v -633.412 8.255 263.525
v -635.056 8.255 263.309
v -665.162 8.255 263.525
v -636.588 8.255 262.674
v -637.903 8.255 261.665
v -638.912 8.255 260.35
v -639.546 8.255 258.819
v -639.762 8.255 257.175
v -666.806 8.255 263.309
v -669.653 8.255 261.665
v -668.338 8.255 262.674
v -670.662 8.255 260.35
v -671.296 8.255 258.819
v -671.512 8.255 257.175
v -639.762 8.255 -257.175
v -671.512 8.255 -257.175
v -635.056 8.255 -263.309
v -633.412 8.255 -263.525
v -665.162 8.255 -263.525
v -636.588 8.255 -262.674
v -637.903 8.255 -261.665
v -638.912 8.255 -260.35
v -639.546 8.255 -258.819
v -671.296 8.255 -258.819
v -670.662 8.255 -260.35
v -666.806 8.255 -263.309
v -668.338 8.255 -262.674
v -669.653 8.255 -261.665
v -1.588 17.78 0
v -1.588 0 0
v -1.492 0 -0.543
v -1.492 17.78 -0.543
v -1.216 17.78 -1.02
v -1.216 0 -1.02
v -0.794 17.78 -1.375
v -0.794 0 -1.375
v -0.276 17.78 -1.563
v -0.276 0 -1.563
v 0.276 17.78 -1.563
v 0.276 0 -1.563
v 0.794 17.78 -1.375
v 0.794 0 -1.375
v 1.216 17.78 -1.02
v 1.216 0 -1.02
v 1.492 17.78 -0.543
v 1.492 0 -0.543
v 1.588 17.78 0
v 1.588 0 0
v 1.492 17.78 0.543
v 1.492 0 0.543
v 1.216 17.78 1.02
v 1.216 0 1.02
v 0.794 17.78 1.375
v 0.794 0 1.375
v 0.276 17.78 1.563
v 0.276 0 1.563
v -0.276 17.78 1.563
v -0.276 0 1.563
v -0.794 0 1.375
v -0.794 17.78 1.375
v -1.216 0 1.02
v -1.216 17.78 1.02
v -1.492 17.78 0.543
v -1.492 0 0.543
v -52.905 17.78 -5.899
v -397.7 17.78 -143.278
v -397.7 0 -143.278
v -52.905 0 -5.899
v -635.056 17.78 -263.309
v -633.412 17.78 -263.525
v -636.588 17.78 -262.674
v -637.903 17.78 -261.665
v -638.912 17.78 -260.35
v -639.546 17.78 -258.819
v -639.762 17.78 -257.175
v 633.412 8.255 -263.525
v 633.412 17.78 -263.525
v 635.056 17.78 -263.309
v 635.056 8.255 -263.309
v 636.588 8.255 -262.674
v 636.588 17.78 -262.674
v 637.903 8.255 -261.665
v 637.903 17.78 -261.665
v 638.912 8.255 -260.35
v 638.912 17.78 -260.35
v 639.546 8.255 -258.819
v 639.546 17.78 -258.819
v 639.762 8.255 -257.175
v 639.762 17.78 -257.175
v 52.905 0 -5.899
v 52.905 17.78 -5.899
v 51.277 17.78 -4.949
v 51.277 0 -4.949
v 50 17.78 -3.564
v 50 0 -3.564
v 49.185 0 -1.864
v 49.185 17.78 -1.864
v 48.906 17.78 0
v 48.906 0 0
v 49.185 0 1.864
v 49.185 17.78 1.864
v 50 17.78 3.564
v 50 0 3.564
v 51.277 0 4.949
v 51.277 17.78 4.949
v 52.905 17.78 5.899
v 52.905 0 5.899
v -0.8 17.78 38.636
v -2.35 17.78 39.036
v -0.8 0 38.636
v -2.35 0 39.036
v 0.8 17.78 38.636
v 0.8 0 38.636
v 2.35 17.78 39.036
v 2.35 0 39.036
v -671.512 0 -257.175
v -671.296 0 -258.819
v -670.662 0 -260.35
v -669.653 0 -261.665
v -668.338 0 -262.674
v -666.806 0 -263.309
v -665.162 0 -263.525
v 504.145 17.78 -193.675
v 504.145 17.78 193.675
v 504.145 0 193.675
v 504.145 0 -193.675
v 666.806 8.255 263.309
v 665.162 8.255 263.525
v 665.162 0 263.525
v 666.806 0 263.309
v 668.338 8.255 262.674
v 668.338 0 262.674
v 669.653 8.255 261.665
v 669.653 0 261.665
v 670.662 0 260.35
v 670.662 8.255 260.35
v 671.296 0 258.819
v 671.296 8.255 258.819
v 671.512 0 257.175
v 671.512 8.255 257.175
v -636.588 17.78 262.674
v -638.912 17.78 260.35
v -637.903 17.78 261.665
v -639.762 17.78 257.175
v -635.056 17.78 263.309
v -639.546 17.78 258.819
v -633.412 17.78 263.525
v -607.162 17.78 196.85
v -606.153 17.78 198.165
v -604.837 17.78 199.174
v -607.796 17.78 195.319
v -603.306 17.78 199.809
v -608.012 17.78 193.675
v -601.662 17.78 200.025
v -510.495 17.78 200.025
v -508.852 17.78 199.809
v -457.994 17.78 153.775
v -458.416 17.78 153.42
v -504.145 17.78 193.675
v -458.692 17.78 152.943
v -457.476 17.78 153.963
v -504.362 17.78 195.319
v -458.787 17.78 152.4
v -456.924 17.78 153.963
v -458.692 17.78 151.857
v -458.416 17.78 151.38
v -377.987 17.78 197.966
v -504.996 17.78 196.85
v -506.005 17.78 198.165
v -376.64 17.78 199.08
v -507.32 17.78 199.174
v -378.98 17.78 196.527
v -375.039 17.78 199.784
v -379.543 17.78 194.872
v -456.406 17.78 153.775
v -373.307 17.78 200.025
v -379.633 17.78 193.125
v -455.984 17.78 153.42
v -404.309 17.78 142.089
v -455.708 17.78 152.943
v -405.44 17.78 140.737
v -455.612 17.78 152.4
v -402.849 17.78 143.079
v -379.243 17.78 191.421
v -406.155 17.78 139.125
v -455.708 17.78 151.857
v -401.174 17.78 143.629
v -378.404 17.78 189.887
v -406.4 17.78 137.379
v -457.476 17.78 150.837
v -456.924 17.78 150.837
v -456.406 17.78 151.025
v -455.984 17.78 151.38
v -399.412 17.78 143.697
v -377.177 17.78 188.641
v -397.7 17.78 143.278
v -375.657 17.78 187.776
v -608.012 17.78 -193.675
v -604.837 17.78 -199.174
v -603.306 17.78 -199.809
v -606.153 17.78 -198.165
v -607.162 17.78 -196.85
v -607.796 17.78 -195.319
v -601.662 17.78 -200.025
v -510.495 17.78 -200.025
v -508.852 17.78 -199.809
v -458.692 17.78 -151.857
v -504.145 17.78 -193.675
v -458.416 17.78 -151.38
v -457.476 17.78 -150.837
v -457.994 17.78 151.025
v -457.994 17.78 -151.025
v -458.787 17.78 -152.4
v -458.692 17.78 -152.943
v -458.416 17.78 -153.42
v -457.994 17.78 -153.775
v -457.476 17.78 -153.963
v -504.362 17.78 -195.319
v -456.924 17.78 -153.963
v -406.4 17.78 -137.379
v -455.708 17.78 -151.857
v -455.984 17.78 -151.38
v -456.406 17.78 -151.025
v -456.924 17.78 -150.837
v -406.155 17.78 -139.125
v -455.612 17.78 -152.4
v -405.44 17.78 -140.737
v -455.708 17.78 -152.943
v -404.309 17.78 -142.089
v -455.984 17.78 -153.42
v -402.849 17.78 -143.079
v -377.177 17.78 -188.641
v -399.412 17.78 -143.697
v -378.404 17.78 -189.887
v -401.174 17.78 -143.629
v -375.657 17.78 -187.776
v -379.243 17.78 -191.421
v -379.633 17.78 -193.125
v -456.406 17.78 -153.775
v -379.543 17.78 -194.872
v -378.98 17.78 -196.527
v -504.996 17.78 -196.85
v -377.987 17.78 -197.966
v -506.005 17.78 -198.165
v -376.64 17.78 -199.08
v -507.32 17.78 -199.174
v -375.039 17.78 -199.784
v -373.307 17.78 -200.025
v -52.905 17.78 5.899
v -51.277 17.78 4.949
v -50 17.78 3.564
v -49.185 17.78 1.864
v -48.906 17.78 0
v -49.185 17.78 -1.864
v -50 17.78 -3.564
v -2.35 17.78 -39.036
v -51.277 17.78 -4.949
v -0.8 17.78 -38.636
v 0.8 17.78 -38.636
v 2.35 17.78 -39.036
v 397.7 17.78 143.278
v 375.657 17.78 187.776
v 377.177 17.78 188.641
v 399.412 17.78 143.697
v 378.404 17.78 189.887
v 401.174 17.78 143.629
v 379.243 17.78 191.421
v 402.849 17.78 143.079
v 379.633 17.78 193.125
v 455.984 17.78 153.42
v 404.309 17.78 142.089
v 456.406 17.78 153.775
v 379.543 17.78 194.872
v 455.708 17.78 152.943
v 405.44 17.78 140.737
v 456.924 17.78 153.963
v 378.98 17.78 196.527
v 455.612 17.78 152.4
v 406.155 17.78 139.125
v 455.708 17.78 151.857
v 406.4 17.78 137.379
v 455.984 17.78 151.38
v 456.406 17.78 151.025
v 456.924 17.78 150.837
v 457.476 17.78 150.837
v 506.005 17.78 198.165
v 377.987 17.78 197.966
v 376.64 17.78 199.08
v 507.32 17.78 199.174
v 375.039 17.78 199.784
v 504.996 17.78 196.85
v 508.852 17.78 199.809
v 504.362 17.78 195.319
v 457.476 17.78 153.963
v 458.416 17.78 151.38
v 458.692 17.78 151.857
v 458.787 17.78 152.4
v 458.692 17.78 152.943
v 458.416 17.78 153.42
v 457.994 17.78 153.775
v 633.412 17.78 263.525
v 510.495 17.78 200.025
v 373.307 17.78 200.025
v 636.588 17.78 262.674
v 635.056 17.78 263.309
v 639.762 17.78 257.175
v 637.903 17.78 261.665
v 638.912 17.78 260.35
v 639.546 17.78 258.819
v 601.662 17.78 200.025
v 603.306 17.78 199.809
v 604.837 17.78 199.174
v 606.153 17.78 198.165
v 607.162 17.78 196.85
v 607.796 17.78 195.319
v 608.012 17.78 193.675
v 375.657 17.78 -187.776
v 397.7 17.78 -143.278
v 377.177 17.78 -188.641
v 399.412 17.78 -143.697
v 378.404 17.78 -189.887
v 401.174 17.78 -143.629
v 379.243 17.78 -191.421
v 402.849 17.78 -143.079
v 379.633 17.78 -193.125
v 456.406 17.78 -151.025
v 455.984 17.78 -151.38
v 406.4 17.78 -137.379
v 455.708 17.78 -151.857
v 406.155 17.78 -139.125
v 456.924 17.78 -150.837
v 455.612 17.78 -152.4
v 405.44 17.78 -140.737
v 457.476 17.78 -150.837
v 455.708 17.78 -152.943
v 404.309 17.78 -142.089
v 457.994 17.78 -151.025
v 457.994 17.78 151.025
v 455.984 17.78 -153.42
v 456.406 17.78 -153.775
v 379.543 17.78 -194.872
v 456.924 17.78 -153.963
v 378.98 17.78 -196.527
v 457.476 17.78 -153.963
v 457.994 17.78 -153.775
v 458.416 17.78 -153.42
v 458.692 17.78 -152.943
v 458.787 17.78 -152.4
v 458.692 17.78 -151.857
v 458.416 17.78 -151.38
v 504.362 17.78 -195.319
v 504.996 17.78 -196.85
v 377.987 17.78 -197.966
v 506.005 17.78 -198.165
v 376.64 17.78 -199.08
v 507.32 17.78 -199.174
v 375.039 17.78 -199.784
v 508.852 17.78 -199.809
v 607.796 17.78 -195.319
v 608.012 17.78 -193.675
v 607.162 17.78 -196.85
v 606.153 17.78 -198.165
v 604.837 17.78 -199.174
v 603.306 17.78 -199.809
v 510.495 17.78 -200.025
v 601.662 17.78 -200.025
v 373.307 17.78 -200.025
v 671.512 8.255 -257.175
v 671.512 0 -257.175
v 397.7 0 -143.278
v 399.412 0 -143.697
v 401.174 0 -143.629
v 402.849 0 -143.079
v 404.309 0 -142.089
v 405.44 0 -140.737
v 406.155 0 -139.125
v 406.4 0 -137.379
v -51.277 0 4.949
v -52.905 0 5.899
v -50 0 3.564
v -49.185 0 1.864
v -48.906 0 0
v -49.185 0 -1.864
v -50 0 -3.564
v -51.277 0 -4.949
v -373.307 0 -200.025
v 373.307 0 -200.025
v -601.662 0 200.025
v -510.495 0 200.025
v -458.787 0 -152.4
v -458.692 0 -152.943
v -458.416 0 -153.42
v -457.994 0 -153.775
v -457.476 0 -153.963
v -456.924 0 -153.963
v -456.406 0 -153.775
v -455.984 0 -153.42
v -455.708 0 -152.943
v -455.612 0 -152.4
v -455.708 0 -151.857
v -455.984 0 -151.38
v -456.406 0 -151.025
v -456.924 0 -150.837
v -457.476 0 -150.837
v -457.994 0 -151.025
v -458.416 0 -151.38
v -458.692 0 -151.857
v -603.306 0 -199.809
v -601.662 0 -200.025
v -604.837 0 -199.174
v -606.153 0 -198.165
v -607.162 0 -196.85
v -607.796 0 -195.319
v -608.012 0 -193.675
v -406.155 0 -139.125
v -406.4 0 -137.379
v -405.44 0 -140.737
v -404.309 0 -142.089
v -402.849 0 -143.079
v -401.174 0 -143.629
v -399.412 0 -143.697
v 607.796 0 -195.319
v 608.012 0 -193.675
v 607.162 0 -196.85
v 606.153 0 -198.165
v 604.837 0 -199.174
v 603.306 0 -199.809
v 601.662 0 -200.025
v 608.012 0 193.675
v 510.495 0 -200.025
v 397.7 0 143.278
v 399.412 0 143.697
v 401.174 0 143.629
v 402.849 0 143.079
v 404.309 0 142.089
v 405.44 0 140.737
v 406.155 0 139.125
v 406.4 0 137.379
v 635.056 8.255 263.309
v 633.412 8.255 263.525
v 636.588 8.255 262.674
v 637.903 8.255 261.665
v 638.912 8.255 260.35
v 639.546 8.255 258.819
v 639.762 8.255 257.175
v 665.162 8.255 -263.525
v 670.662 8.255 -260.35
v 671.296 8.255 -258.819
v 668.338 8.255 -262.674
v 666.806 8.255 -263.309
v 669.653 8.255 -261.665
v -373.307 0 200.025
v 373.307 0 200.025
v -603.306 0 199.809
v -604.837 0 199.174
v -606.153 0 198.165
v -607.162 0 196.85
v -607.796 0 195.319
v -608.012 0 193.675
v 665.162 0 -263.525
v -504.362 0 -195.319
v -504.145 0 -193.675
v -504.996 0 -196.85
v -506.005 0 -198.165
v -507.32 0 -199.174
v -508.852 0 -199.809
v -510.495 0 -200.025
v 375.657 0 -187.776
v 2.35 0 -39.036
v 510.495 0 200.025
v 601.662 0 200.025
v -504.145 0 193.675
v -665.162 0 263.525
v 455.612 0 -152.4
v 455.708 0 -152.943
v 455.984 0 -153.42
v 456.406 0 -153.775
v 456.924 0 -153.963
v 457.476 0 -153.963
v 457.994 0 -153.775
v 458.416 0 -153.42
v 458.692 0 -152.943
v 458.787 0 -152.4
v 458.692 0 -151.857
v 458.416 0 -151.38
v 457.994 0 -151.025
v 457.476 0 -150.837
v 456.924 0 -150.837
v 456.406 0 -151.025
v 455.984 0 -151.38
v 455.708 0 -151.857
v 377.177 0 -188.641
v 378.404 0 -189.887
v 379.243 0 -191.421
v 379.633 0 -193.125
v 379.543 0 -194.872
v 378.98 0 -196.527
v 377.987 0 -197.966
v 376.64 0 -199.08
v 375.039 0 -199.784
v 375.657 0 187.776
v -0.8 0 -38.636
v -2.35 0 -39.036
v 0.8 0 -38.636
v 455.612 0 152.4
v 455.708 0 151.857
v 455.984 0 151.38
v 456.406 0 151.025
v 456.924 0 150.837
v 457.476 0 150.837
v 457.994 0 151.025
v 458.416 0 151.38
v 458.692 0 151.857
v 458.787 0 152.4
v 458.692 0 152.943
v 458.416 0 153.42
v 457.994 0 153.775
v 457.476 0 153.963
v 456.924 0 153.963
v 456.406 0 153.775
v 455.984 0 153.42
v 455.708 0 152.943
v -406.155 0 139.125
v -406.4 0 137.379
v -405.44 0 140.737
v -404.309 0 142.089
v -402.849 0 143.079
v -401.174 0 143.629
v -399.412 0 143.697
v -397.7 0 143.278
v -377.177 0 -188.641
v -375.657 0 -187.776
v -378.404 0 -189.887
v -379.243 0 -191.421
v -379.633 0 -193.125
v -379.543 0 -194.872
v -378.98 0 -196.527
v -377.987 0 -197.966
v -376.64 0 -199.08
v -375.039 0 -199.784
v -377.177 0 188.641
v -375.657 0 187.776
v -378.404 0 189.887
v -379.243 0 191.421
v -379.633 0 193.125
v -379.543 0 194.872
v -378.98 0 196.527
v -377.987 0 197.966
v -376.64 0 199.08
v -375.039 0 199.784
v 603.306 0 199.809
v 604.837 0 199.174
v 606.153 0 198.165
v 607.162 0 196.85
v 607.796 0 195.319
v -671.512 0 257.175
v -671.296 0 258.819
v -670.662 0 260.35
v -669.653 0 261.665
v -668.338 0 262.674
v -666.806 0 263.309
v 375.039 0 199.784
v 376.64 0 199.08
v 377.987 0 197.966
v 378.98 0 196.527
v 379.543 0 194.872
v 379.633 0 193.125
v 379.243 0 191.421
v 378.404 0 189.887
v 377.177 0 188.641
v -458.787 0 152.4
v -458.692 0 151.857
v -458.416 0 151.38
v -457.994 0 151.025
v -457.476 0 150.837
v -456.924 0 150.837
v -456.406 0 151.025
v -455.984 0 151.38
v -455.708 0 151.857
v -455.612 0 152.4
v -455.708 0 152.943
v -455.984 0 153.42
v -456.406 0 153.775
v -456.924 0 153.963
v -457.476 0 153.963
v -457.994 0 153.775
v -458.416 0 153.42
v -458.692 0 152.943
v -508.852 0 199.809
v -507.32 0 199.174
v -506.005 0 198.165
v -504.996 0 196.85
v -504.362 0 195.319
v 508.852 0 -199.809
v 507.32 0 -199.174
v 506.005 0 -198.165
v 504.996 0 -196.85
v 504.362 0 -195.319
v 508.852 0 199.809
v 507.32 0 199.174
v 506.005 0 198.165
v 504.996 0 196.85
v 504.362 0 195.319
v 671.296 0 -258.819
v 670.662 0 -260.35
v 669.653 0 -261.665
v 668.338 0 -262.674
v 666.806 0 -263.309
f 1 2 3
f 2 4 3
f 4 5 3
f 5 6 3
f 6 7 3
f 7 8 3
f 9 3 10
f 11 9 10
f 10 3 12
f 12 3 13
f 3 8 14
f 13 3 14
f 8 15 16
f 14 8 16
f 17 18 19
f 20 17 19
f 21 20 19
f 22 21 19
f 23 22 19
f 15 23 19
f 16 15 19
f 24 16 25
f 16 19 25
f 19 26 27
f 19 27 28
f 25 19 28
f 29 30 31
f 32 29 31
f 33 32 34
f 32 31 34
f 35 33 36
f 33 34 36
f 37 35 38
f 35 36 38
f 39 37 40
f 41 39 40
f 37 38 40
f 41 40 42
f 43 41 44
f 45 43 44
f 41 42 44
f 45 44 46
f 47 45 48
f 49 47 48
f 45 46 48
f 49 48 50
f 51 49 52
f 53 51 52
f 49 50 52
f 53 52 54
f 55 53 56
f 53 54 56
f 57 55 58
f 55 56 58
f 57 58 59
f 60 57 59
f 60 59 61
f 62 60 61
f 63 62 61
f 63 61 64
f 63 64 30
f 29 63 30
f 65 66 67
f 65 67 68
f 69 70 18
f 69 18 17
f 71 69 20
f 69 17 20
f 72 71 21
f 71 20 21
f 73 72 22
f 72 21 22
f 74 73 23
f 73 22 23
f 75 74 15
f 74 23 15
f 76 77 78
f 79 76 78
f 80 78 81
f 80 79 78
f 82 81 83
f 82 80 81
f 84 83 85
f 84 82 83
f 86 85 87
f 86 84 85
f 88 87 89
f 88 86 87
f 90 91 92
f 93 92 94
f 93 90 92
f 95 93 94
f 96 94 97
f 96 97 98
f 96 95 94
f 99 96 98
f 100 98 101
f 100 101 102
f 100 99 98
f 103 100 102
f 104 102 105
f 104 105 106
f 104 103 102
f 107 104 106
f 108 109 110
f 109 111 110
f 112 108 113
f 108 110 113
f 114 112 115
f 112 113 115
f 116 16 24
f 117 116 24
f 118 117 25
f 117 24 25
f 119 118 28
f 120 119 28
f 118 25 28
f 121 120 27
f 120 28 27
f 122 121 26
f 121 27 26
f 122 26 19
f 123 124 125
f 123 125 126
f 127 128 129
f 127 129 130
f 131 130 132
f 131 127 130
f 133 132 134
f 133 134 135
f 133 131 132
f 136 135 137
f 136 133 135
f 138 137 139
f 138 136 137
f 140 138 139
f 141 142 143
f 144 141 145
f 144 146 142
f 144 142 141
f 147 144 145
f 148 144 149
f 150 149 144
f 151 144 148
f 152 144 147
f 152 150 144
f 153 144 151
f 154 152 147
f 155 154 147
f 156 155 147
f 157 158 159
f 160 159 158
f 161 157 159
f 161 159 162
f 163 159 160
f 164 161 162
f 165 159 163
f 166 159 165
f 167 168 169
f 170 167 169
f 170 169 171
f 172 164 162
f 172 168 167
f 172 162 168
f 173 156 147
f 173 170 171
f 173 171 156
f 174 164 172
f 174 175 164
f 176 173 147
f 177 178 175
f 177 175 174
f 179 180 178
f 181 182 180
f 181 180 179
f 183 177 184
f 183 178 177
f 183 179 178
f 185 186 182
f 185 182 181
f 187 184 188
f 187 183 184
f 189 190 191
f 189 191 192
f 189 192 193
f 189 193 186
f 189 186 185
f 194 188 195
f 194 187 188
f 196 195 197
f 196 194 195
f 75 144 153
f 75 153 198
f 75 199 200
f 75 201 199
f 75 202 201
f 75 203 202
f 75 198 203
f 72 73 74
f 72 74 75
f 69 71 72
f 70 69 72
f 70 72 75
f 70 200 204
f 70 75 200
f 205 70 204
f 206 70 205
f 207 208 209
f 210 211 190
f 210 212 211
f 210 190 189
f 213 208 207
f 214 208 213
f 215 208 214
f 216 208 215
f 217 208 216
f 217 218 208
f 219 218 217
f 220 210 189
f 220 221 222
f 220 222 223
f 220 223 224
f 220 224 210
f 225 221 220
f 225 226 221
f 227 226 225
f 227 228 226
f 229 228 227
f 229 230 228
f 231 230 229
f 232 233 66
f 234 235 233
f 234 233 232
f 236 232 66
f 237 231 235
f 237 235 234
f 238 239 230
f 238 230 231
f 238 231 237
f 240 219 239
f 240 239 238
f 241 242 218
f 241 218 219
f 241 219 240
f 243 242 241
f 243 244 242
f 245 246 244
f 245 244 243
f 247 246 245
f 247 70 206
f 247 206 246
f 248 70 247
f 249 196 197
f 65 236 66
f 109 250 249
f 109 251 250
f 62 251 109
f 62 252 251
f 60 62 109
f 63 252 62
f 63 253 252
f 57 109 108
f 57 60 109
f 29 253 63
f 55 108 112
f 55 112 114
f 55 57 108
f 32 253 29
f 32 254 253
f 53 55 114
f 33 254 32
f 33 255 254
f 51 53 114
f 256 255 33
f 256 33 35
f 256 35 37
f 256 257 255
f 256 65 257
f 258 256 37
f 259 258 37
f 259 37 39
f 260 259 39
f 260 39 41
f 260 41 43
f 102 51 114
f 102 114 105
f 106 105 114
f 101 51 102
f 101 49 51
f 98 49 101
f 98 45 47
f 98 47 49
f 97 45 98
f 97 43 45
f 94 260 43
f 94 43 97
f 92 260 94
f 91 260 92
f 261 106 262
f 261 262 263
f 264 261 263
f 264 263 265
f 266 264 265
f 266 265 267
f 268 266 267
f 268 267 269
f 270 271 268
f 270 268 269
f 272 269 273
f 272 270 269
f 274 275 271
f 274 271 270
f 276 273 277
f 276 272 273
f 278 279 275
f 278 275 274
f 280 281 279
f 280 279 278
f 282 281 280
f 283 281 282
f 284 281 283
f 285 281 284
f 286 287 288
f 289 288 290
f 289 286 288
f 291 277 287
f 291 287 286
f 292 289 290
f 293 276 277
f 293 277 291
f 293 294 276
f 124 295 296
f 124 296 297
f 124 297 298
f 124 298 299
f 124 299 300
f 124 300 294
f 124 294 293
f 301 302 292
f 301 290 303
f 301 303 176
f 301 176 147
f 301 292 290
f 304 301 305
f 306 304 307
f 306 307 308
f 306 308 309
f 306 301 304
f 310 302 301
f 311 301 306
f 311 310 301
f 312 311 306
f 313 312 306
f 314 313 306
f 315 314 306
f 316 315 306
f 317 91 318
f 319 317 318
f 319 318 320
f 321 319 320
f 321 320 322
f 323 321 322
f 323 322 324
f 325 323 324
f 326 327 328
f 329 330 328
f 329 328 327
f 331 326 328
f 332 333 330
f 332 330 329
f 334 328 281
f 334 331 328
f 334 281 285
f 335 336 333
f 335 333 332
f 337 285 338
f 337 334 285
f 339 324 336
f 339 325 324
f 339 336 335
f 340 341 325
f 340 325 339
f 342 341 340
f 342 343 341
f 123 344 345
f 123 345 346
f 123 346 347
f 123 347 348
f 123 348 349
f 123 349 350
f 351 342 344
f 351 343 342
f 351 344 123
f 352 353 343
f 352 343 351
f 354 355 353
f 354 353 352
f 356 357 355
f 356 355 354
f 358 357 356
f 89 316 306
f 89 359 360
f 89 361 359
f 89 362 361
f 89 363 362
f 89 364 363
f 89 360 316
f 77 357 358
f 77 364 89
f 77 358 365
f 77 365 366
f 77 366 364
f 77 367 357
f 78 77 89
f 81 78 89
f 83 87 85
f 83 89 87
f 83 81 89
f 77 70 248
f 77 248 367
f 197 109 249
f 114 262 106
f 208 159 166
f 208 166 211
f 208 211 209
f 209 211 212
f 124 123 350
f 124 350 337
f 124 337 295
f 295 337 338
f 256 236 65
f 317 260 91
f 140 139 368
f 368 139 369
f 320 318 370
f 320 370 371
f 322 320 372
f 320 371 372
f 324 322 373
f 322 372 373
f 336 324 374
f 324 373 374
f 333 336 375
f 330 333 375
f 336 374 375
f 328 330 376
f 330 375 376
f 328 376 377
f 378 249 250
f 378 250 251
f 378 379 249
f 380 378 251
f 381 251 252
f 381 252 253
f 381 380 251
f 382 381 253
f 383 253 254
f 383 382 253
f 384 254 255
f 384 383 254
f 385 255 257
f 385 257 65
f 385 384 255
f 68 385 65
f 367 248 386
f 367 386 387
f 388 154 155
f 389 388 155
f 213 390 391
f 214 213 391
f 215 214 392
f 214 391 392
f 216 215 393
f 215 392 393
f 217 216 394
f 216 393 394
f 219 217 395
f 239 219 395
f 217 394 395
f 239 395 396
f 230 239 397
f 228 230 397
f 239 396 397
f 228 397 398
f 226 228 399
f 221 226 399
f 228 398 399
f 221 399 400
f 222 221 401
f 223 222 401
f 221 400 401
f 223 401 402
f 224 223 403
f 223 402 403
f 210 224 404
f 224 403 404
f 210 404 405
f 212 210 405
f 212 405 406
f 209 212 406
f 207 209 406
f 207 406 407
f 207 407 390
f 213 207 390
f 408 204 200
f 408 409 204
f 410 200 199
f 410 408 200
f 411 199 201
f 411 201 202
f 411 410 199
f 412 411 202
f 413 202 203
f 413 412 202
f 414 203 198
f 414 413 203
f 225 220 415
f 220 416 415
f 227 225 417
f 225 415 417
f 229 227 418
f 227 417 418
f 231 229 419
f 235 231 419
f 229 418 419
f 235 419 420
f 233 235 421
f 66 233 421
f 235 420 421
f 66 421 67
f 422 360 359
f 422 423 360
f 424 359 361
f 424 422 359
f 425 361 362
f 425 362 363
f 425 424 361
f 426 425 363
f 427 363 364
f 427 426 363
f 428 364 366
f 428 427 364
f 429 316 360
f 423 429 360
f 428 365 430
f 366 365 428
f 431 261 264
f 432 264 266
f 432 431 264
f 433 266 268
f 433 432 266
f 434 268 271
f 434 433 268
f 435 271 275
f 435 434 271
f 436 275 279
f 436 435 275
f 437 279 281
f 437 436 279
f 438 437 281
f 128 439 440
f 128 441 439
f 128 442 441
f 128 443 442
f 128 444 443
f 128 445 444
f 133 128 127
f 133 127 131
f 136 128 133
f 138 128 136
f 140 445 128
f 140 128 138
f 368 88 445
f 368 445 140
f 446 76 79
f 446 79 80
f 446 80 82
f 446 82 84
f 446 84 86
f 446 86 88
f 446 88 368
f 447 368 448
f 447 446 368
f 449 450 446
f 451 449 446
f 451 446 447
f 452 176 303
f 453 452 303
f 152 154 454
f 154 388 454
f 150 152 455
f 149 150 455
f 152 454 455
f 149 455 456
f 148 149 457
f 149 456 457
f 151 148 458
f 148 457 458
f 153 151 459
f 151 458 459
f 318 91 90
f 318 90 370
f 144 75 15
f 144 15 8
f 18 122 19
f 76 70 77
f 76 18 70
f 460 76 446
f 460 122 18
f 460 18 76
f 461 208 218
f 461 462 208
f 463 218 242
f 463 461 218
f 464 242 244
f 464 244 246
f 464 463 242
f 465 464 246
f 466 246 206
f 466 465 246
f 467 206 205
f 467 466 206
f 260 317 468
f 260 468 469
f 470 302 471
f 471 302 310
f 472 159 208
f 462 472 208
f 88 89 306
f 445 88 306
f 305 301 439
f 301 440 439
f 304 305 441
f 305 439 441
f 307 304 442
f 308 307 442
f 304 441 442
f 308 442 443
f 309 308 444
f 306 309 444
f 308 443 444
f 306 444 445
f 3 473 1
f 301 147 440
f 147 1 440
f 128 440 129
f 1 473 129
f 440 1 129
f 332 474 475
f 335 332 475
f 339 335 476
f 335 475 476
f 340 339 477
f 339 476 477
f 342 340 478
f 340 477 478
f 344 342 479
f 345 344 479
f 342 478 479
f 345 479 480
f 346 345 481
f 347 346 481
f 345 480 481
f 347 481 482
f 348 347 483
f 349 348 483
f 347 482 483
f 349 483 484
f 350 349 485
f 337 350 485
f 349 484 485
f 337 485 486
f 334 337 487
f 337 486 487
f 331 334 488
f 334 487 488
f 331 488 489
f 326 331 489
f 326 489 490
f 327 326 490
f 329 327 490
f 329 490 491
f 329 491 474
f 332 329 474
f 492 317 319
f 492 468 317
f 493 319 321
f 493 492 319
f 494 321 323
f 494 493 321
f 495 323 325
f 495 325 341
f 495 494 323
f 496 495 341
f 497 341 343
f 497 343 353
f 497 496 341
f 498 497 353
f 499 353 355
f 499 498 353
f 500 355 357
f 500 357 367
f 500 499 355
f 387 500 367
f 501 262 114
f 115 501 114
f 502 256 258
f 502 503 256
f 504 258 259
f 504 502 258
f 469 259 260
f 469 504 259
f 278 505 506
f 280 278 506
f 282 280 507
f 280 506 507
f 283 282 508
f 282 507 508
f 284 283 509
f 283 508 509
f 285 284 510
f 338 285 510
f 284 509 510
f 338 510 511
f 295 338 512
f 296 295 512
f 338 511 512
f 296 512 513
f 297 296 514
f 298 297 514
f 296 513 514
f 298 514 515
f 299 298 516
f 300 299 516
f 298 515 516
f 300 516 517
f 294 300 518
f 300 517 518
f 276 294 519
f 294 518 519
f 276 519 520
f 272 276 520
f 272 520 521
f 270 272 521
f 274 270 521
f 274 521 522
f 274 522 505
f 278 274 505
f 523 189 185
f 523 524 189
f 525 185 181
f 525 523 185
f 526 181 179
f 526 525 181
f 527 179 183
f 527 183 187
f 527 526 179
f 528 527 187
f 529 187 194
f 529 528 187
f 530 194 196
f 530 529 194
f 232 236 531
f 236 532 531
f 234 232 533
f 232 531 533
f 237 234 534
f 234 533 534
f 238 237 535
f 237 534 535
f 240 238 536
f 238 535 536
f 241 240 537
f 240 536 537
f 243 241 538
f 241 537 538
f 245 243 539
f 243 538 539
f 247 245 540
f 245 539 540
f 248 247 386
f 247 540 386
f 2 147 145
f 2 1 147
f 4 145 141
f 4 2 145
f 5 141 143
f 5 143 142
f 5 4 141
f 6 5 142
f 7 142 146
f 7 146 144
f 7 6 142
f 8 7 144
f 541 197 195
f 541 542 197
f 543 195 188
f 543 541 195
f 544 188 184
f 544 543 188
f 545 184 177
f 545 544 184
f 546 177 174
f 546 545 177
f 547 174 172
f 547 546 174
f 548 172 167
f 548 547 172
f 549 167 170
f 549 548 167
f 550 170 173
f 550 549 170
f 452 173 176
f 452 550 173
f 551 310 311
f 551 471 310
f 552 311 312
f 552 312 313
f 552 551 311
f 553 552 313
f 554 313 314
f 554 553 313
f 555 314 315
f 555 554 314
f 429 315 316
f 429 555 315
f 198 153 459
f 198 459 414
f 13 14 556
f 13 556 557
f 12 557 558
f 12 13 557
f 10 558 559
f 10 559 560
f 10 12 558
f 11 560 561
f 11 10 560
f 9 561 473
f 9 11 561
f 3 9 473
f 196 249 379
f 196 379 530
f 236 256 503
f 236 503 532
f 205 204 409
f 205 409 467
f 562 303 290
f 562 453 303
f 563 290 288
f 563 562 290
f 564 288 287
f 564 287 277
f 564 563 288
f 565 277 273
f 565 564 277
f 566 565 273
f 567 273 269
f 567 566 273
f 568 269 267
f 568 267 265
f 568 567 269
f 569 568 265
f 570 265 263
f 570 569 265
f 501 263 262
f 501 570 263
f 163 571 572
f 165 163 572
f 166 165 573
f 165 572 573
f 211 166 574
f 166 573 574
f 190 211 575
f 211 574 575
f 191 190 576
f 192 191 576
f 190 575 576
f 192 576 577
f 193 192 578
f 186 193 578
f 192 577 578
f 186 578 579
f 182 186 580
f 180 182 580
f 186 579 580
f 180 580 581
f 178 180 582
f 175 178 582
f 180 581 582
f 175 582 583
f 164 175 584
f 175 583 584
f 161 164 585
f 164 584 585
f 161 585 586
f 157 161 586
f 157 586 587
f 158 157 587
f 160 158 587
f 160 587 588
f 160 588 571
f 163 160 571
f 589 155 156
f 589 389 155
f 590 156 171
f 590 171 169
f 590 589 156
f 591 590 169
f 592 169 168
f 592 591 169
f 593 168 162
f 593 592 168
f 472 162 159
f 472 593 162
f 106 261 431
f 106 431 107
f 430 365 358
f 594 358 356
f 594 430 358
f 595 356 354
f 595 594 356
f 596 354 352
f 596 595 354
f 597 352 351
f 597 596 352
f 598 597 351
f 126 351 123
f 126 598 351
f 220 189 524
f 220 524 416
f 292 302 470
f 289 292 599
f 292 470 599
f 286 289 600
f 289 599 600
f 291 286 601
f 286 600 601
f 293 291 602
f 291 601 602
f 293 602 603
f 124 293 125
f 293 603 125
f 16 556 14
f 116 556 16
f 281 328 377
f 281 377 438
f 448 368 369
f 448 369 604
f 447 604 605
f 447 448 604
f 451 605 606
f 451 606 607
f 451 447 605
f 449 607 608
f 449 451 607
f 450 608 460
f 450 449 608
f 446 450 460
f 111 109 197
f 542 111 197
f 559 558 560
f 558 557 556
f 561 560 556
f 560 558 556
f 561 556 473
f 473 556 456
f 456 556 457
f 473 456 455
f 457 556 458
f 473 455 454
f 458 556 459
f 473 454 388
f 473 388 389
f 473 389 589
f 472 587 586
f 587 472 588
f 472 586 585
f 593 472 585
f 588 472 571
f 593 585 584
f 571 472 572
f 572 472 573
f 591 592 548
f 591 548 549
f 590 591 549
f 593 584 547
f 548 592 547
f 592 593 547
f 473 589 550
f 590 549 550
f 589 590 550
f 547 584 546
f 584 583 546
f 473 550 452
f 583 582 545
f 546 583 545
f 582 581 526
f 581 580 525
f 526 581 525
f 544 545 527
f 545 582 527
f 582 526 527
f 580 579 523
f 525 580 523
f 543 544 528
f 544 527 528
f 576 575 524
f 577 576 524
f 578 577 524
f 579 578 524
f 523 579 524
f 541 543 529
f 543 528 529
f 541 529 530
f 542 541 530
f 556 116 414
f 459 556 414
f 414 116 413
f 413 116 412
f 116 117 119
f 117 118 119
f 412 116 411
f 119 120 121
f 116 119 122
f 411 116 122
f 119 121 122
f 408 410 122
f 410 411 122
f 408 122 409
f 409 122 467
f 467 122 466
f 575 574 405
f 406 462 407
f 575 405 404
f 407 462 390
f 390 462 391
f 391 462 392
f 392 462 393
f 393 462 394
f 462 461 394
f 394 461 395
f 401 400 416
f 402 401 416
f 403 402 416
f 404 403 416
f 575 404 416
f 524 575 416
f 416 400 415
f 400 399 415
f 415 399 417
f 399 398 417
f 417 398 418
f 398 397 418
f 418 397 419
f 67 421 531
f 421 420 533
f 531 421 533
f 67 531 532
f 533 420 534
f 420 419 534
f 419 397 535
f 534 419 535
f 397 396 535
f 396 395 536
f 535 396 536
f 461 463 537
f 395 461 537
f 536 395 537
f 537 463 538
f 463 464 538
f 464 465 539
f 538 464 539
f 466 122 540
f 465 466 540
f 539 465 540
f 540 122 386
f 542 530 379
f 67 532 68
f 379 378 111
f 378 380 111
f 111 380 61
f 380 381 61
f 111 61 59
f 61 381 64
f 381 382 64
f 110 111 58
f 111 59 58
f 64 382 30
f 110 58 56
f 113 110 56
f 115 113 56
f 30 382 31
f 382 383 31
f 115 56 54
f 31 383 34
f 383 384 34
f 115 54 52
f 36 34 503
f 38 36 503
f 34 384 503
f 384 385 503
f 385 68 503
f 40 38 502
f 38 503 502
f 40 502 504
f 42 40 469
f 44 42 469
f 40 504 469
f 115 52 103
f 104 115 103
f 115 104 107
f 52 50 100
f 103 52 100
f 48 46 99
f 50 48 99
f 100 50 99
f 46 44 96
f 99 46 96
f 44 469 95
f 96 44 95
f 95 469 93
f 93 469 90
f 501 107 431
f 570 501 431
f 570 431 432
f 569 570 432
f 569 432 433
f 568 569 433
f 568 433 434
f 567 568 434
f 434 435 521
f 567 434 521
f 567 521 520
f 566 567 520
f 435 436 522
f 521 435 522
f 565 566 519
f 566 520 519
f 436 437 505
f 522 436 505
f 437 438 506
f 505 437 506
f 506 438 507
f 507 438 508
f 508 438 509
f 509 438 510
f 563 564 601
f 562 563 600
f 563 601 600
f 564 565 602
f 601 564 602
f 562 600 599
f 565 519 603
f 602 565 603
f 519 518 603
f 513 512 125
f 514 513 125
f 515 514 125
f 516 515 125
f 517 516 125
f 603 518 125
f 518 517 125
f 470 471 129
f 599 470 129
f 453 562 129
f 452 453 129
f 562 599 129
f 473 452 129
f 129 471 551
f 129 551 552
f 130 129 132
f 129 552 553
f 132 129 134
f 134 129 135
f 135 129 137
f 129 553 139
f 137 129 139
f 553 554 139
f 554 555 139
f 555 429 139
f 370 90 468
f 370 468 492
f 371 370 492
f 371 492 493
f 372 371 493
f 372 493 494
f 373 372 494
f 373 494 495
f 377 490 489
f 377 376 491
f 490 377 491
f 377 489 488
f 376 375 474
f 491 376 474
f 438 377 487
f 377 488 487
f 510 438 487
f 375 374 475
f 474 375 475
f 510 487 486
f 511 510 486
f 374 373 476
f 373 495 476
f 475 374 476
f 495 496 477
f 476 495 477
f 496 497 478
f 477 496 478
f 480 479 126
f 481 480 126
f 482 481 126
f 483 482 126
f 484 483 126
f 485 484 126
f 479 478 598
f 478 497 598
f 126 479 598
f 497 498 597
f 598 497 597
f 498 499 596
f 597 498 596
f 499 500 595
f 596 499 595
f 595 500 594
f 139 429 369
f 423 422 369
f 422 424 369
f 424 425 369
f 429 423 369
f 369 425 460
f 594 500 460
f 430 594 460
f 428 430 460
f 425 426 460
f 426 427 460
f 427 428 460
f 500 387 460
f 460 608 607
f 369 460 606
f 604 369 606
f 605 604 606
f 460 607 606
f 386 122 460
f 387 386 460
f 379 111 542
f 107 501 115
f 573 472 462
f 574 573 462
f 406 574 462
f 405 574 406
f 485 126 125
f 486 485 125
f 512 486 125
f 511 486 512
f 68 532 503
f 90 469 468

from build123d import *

# Parameters (mm, degrees)
SKETCH1_W                    = 1343.025
SKETCH1_H                    = 527.05
BOSS_EXTRUDE1_DEPTH          = 17.78
FILLET1_R                    = 6.35
F_1_8_0_125_DIAMETER_HOLE1_D = 3.175
SKETCH5_W                    = 103.867264199
SKETCH5_H                    = 400.05
CUT_EXTRUDE1_DEPTH           = 722.588935393
CUT_EXTRUDE2_DEPTH           = 9.525
FILLET2_R                    = 6.35


with BuildPart() as part:
    # Sketch1 → Boss-Extrude1 (new body)
    with BuildSketch(Plane(origin=(0, 0, 0), x_dir=(1, 0, 0), z_dir=(0, 1, 0))):
        Rectangle(SKETCH1_W, SKETCH1_H)
    extrude(amount=BOSS_EXTRUDE1_DEPTH)

    # Fillet1
    fillet1_edges = [part.edges().sort_by_distance(p)[0] for p in [
        (671.5125, 8.89, 263.525),
        (-671.5125, 8.89, 263.525),
        (-671.5125, 8.89, -263.525),
        (671.5125, 8.89, -263.525),
    ]]
    fillet(fillet1_edges, radius=FILLET1_R)

    # 1/8 (0.125) Diameter Hole1 (through all)
    with Locations(Plane(origin=(0, 17.78, 0), x_dir=(1, 0, 0), z_dir=(0, 1, 0))):
        with Locations((0, 0), (457.2, 152.4), (-457.2, -152.4), (-457.2, 152.4), (457.2, -152.4)):
            Hole(F_1_8_0_125_DIAMETER_HOLE1_D / 2)

    # Sketch5 → Cut-Extrude1 (cut, through all)
    with BuildSketch(Plane(origin=(0, 17.78, 0), x_dir=(1, 0, 0), z_dir=(0, 1, 0))):
        Polygon((-406.4, 200.025), (406.4, 200.025), (0, 38.1), align=None)
        Polygon((0, -38.1), (-406.4, -200.025), (406.4, -200.025), align=None)
        Polygon((406.4, 146.74453125), (406.4, -146.74453125), (38.1, 0), align=None)
        Polygon((-406.4, 146.74453125), (-38.1, 0), (-406.4, -146.74453125), align=None)
        with Locations((556.0788679, 0)):
            Rectangle(SKETCH5_W, SKETCH5_H)
        with Locations((-556.0788679, 0)):
            Rectangle(SKETCH5_W, SKETCH5_H)
    extrude(amount=-CUT_EXTRUDE1_DEPTH, mode=Mode.SUBTRACT)

    # Sketch6 → Cut-Extrude2 (cut)
    with BuildSketch(Plane(origin=(0, 17.78, 0), x_dir=(1, 0, 0), z_dir=(0, 1, 0))):
        with BuildLine():
            Line((639.7625, -263.525), (665.1625, -263.525))
            ThreePointArc((665.1625, -263.525), (669.652628061, -261.665128061), (671.5125, -257.175))
            Line((671.5125, -257.175), (671.5125, 257.175))
            ThreePointArc((671.5125, 257.175), (669.652628061, 261.665128061), (665.1625, 263.525))
            Line((665.1625, 263.525), (639.7625, 263.525))
            Line((639.7625, 263.525), (639.7625, -263.525))
        make_face()
        with BuildLine():
            Line((-639.7625, -263.525), (-665.1625, -263.525))
            ThreePointArc((-665.1625, -263.525), (-669.652628061, -261.665128061), (-671.5125, -257.175))
            Line((-671.5125, -257.175), (-671.5125, 257.175))
            ThreePointArc((-671.5125, 257.175), (-669.652628061, 261.665128061), (-665.1625, 263.525))
            Line((-665.1625, 263.525), (-639.7625, 263.525))
            Line((-639.7625, 263.525), (-639.7625, -263.525))
        make_face()
    extrude(amount=-CUT_EXTRUDE2_DEPTH, mode=Mode.SUBTRACT)

    # Fillet2
    fillet2_edges = [part.edges().sort_by_distance(p)[0] for p in [
        (-504.145235801, 8.89, -200.025),
        (-504.145235801, 8.89, 200.025),
        (-608.0125, 8.89, 200.025),
        (-608.0125, 8.89, -200.025),
        (-406.4, 8.89, 146.74453125),
        (-406.4, 8.89, -146.74453125),
        (-38.1, 8.89, 0),
        (608.0125, 8.89, -200.025),
        (608.0125, 8.89, 200.025),
        (504.145235801, 8.89, 200.025),
        (504.145235801, 8.89, -200.025),
        (0, 8.89, 38.1),
        (406.4, 8.89, 200.025),
        (-406.4, 8.89, 200.025),
        (38.1, 8.89, 0),
        (406.4, 8.89, -146.74453125),
        (406.4, 8.89, 146.74453125),
        (639.7625, 13.0175, 263.525),
        (639.7625, 13.0175, -263.525),
        (-639.7625, 13.0175, -263.525),
        (-639.7625, 13.0175, 263.525),
        (406.4, 8.89, -200.025),
        (0, 8.89, -38.1),
        (-406.4, 8.89, -200.025),
    ]]
    fillet(fillet2_edges, radius=FILLET2_R)


solid = part.part
